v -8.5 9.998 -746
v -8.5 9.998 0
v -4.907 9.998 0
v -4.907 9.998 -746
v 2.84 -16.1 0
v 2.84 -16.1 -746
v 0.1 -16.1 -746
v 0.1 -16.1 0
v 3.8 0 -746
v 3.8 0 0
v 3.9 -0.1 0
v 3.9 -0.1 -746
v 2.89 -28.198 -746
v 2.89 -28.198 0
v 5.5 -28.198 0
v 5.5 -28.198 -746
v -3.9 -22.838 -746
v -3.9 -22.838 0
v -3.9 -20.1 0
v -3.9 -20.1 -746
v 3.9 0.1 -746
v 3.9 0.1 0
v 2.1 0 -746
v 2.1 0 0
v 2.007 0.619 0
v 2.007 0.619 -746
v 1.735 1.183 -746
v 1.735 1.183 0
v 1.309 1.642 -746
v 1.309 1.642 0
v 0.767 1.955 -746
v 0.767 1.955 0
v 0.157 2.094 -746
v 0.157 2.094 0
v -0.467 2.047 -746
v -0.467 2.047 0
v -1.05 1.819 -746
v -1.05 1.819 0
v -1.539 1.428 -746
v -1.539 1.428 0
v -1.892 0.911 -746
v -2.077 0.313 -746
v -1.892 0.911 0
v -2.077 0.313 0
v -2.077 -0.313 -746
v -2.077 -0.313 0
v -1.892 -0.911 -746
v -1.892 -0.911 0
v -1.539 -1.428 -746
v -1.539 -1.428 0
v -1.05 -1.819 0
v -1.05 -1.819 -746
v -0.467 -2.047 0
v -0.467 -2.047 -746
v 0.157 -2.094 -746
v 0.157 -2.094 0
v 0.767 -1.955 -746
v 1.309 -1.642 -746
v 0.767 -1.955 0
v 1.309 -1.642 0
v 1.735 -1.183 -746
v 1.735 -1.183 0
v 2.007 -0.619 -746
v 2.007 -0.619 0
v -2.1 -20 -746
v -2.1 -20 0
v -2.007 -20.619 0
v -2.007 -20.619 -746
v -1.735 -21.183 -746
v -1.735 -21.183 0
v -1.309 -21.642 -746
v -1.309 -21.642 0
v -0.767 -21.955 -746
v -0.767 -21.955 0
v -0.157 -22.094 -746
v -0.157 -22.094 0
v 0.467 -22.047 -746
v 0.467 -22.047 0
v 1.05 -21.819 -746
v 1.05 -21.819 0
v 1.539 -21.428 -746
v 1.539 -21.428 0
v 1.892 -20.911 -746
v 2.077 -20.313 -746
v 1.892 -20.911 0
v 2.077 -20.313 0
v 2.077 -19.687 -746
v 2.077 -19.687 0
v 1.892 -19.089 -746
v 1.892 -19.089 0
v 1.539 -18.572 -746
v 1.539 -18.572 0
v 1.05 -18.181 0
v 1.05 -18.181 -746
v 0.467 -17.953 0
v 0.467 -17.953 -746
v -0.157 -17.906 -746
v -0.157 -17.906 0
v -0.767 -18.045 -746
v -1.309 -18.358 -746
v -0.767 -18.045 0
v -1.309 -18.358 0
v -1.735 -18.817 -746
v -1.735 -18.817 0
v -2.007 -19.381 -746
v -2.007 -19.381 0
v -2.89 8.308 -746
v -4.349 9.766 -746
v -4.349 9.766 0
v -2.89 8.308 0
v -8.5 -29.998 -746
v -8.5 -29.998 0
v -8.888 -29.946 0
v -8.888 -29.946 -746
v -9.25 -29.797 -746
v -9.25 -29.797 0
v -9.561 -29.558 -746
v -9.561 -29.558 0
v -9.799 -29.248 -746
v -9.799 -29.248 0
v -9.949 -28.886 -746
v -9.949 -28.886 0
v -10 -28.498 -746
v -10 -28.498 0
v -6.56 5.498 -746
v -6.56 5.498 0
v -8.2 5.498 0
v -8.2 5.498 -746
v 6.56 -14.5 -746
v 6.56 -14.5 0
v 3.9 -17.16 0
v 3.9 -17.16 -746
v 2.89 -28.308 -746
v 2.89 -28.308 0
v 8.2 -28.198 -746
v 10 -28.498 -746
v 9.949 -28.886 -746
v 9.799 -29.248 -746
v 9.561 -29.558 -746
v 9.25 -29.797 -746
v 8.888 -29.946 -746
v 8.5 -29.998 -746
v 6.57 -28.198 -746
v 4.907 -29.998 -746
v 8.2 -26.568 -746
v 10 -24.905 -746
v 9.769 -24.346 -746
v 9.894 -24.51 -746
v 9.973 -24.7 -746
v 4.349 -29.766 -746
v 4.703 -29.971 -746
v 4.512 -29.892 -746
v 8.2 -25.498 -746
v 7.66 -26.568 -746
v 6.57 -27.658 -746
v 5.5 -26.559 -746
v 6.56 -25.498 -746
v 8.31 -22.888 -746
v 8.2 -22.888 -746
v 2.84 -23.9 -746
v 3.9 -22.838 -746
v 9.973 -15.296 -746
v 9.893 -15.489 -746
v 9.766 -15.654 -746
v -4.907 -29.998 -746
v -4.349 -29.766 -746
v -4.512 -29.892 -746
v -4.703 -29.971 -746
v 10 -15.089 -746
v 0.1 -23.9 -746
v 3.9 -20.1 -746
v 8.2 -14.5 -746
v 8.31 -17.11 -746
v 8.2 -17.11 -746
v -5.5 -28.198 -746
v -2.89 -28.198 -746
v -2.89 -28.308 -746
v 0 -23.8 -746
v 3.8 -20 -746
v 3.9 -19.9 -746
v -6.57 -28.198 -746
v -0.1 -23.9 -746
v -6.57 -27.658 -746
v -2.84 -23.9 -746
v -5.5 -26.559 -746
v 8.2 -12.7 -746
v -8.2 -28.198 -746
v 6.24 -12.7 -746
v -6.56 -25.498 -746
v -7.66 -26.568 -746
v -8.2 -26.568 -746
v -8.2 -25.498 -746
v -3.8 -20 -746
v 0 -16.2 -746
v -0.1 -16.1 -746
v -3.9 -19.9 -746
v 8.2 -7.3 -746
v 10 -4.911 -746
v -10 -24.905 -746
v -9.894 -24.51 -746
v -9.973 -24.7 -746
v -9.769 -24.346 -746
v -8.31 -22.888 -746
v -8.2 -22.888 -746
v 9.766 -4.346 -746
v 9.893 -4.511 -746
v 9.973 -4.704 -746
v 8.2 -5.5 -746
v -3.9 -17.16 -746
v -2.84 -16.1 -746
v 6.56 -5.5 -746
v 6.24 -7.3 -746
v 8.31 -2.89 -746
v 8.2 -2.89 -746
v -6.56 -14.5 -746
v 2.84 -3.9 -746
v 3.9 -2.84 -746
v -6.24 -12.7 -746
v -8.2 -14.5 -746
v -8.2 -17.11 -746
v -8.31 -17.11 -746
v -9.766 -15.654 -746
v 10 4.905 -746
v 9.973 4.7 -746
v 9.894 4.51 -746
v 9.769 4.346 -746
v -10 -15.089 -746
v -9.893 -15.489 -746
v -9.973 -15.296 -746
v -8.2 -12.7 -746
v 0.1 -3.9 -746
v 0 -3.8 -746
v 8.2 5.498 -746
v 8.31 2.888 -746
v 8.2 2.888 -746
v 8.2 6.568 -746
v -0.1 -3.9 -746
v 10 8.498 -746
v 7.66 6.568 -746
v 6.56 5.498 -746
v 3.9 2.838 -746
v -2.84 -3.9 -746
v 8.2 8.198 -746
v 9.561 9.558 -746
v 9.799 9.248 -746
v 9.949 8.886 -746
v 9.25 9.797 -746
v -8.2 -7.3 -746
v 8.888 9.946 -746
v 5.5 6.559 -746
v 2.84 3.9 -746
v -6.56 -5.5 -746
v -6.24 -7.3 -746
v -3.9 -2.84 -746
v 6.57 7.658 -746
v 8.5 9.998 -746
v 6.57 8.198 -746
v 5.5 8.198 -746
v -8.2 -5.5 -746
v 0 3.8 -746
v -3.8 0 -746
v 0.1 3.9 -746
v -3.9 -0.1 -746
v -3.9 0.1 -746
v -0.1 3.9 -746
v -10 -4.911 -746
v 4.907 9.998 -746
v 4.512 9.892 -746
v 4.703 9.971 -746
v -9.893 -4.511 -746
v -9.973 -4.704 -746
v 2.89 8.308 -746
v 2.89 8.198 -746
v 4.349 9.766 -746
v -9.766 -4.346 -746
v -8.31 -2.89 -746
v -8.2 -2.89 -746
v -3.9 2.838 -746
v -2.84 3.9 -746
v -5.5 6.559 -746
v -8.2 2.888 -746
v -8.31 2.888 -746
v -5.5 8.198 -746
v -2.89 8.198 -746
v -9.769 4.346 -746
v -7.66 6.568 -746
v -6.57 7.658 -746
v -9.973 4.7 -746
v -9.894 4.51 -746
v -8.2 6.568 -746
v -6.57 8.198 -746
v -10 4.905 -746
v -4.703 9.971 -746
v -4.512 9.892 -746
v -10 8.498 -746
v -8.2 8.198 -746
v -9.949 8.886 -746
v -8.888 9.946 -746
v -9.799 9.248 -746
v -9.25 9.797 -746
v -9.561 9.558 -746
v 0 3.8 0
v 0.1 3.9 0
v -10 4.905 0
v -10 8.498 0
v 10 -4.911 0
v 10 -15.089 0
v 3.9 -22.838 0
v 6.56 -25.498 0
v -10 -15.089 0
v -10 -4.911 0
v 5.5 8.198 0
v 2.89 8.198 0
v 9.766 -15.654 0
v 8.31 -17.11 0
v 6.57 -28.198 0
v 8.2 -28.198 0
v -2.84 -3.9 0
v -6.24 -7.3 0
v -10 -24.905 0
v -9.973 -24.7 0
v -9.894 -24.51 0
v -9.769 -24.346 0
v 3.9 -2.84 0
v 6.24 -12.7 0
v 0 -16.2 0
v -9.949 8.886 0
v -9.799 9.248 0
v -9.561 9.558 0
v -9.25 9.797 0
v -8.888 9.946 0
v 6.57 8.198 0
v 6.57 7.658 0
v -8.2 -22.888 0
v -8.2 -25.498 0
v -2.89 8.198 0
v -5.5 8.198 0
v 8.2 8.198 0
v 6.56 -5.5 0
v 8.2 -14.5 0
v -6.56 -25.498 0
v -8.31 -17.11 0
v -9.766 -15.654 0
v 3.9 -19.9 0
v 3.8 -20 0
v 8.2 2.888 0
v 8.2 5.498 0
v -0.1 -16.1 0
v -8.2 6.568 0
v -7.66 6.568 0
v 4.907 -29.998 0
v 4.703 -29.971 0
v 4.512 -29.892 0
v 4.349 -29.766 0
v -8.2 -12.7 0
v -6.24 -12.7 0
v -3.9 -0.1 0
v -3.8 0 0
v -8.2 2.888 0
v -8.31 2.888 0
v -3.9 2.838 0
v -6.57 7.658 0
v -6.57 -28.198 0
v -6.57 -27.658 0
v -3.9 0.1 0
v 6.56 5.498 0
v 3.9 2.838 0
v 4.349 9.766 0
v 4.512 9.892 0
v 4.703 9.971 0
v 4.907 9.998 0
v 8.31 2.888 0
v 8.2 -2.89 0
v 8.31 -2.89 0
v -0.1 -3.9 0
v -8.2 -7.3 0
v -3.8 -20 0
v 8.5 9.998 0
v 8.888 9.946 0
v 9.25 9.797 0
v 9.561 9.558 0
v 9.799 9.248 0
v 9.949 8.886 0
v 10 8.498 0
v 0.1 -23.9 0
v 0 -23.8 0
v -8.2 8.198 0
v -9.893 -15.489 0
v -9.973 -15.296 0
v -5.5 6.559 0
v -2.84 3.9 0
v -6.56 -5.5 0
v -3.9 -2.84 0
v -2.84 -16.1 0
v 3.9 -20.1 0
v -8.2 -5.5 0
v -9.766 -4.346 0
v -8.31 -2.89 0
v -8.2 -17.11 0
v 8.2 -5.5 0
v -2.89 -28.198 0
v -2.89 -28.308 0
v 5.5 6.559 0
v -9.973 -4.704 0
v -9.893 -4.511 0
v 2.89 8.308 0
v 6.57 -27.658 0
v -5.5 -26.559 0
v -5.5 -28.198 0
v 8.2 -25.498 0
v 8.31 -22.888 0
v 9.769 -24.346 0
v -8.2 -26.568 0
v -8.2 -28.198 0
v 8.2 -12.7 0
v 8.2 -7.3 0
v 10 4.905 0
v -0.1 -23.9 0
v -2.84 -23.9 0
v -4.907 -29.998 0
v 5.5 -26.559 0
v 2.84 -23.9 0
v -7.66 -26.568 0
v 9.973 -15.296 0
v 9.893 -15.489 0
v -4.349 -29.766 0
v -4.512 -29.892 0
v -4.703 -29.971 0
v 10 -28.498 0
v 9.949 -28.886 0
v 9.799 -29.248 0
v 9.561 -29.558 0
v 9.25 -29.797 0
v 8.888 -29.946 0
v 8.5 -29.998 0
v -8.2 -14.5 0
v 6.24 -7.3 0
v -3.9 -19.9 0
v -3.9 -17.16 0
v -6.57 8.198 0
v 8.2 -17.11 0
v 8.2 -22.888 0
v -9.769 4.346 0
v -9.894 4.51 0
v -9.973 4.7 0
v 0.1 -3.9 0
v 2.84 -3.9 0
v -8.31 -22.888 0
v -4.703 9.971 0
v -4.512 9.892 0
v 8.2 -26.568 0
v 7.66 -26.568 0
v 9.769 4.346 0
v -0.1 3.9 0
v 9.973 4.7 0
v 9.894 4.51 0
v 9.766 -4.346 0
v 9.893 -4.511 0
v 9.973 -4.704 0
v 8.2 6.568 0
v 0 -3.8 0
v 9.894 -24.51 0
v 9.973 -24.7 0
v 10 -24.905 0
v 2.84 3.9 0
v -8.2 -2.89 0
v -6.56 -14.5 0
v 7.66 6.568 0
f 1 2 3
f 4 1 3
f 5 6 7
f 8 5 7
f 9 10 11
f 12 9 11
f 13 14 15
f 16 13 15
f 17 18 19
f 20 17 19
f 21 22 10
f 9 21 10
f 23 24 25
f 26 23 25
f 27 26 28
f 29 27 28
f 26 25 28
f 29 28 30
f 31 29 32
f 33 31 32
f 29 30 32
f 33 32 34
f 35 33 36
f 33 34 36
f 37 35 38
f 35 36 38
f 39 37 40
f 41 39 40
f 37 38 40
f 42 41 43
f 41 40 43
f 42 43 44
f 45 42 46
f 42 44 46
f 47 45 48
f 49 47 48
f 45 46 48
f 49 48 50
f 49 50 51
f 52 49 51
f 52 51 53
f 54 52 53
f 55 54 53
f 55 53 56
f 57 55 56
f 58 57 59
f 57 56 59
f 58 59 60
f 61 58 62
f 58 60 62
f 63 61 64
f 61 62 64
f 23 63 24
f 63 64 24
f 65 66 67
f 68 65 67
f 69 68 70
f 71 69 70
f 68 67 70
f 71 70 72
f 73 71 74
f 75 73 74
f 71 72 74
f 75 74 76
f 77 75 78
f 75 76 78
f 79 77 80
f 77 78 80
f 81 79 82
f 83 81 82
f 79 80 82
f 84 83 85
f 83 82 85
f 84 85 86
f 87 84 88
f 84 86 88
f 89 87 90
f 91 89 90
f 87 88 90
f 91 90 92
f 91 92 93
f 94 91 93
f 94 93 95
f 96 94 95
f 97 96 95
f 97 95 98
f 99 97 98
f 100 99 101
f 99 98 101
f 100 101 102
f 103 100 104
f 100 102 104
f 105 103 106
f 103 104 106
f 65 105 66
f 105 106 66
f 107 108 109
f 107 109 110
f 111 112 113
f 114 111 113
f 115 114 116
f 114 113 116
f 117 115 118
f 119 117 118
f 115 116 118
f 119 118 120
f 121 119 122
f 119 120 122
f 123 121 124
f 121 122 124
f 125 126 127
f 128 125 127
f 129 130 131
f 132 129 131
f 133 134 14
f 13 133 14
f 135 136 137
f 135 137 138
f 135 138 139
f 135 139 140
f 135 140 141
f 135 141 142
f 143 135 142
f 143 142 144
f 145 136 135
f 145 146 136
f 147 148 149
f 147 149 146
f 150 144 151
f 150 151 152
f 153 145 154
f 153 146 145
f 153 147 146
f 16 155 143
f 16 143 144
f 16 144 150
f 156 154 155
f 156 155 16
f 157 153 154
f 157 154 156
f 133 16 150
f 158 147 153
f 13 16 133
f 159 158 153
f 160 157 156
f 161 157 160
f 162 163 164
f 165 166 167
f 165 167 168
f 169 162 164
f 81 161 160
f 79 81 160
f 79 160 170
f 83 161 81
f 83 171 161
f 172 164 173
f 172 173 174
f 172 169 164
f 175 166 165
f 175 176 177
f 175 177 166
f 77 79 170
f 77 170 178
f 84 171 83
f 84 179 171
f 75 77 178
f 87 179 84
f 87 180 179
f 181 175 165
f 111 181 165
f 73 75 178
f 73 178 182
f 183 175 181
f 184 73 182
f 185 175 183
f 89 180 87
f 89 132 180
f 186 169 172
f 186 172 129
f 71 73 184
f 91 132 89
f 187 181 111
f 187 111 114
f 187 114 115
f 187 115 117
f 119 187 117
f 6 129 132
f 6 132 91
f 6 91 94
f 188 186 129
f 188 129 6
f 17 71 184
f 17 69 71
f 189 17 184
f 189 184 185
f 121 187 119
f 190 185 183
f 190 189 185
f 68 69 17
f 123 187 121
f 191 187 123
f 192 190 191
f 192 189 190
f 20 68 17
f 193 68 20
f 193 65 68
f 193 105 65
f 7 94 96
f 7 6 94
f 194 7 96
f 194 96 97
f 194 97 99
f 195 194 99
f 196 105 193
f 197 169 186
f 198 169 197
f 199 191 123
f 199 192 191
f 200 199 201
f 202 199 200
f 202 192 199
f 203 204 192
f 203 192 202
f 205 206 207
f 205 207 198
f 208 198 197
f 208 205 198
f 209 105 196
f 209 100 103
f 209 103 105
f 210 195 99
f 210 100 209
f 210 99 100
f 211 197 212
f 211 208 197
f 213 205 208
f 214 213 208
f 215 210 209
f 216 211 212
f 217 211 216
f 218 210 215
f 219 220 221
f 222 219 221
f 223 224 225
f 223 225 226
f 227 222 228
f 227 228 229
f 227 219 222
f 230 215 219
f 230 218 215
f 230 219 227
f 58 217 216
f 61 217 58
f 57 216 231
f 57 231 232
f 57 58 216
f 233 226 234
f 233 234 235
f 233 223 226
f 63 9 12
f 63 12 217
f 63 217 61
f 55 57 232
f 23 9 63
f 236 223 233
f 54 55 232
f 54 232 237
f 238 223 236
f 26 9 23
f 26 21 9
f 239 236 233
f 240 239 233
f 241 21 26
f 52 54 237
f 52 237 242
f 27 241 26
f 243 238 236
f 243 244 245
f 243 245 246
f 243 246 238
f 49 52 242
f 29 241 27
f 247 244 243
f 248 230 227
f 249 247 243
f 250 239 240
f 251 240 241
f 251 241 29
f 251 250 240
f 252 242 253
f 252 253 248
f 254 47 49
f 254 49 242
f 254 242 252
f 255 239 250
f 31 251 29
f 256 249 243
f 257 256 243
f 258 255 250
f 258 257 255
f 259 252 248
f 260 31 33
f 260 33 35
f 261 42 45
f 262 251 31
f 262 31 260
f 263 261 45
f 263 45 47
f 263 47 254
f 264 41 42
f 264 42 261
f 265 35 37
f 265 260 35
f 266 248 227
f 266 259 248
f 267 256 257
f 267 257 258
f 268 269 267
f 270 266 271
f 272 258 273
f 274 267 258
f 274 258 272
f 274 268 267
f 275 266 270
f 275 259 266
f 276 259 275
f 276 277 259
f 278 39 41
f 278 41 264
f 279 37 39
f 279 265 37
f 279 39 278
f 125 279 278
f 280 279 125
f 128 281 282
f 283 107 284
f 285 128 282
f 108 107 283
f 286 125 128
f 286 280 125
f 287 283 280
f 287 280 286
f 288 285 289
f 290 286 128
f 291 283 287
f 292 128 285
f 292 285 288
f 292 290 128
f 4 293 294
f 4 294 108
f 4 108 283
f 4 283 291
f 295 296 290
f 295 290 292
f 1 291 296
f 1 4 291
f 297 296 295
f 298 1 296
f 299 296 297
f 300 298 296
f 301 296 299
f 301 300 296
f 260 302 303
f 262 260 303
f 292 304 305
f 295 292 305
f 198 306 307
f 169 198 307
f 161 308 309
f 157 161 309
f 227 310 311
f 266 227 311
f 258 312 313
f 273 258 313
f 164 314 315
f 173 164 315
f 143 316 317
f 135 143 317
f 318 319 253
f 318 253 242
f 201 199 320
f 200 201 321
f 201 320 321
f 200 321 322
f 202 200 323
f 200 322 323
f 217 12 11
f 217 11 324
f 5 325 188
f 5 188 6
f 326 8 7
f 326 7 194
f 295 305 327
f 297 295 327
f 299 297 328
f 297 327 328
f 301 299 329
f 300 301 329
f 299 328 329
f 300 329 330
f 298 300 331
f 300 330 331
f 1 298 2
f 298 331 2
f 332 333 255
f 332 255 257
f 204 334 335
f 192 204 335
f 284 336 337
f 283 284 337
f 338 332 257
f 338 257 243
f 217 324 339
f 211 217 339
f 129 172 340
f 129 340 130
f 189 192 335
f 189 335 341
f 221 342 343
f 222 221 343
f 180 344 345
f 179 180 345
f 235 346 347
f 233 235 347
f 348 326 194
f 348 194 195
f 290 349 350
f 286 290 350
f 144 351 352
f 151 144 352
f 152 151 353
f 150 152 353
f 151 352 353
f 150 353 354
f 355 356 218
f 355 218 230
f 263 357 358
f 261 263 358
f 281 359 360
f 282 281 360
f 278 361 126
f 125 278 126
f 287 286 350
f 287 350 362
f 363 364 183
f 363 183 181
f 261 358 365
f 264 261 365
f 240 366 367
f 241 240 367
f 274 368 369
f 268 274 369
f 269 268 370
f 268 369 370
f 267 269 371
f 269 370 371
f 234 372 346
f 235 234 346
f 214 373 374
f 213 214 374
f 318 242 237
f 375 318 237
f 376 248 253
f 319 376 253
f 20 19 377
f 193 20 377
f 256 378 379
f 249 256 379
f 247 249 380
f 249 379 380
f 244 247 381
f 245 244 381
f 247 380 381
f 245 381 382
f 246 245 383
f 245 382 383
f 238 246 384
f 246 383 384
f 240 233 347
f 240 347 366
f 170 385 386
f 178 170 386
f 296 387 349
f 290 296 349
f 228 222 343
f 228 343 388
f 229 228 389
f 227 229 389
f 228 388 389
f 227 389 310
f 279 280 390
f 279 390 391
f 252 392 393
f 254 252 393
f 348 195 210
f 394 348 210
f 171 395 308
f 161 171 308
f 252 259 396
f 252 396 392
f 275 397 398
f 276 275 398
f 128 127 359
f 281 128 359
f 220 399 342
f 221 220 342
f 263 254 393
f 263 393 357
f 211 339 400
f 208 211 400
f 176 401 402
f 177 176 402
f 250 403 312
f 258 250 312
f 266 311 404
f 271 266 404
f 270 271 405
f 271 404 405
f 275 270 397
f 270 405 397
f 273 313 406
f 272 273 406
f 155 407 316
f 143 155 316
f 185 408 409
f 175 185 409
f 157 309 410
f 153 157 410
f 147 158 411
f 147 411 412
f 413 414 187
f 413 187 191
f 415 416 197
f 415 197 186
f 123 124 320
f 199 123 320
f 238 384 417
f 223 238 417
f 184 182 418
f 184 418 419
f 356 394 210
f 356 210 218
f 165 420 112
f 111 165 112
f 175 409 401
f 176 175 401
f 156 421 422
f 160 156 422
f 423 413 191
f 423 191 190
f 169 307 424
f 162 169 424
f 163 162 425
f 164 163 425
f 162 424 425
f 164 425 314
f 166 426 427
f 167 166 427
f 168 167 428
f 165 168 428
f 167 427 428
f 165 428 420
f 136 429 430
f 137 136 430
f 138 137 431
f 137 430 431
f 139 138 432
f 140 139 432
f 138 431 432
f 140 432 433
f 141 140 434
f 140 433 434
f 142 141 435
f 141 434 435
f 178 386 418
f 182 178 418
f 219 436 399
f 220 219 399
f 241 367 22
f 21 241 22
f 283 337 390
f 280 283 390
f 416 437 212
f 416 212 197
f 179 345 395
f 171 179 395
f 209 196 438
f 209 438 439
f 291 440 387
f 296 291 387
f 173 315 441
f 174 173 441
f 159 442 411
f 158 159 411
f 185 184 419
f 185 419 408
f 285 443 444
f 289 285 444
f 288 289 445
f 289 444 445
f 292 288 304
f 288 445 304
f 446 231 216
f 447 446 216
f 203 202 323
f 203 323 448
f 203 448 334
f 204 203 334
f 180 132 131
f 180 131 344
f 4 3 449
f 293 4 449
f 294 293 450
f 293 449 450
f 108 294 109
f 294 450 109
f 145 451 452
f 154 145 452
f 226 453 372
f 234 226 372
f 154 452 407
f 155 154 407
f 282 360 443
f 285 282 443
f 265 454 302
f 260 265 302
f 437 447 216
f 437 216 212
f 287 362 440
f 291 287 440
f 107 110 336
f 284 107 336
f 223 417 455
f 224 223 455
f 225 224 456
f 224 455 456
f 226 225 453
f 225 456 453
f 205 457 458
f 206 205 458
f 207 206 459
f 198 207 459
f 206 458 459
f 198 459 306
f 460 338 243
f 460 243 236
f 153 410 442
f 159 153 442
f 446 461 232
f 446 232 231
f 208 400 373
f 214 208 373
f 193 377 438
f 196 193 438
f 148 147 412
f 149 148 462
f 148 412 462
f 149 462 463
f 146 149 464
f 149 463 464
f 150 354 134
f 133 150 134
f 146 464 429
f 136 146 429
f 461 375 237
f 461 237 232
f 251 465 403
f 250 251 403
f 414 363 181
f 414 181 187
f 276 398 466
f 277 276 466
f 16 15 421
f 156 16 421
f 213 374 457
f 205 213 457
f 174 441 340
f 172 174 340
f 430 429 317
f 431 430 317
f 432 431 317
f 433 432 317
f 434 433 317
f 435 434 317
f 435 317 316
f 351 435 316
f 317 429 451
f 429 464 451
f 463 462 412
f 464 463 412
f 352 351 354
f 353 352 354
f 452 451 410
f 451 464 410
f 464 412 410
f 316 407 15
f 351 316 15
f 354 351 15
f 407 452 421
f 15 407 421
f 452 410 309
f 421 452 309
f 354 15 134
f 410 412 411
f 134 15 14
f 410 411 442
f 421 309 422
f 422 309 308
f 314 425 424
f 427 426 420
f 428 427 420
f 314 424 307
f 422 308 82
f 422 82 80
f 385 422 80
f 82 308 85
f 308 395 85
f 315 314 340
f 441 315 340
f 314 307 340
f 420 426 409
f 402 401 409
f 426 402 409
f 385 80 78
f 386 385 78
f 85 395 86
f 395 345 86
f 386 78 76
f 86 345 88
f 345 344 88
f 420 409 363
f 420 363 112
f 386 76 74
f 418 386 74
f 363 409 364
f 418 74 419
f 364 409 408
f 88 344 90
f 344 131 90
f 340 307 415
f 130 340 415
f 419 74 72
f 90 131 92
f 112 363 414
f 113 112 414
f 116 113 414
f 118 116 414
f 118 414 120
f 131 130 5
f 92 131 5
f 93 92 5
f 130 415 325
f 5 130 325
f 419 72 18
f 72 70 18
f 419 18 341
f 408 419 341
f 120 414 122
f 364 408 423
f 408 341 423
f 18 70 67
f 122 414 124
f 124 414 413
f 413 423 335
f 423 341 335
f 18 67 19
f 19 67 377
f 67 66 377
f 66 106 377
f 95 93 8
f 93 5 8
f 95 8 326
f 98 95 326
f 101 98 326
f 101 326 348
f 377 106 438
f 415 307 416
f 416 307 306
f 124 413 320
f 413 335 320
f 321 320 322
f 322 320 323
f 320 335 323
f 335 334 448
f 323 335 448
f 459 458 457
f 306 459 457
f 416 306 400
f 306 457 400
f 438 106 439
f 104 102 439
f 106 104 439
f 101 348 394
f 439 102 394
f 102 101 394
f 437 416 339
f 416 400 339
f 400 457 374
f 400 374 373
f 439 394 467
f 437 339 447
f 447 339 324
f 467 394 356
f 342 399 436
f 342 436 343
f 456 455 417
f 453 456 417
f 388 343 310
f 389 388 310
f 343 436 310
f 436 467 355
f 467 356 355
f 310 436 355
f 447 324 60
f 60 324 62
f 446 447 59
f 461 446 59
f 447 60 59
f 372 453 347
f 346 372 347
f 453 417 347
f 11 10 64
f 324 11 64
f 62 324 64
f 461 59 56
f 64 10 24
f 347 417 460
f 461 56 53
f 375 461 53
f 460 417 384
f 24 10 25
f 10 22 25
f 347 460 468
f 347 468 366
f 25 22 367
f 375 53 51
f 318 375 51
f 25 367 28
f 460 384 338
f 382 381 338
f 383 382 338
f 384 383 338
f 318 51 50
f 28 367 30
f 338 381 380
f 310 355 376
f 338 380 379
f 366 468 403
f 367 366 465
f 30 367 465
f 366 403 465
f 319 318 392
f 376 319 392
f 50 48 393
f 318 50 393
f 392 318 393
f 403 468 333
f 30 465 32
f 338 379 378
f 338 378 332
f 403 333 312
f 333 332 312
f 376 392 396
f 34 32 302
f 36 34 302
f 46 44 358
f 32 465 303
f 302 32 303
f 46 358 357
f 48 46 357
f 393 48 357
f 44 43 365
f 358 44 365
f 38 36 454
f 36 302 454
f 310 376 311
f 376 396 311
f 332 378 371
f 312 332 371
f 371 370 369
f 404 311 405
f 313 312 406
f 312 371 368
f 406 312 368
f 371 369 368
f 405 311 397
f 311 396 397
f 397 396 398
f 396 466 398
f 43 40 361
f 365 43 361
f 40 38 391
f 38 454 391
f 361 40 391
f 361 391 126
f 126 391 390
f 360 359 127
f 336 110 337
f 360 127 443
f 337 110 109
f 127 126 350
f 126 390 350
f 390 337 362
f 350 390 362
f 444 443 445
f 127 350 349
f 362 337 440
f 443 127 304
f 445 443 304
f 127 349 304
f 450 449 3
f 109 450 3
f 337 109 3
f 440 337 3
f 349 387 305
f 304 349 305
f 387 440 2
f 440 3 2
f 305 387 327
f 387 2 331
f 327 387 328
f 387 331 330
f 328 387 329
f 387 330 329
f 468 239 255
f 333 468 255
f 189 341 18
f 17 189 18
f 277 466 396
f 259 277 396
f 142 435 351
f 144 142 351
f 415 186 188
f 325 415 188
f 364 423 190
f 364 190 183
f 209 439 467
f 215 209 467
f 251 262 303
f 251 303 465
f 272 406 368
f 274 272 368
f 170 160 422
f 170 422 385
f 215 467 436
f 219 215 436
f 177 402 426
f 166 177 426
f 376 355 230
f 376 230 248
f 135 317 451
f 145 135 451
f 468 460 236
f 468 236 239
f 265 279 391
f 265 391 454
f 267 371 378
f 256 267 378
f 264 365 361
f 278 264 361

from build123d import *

# Parameters (mm, degrees)
SKETCH2_R           = 2.1
BOSS_EXTRUDE1_DEPTH = 746


with BuildPart() as part:
    # Sketch2 → Boss-Extrude1 (new body)
    with BuildSketch(Plane.XY):
        with BuildLine():
            Line((-0.1, 3.9), (0, 3.8))
            Line((0, 3.8), (0.1, 3.9))
            Line((0.1, 3.9), (2.840365134, 3.9))
            Line((2.840365134, 3.9), (5.5, 6.558825842))
            Line((5.5, 6.558825842), (5.5, 8.197505675))
            Line((5.5, 8.197505675), (2.89, 8.197505675))
            Line((2.89, 8.197505675), (2.89, 8.307505675))
            Line((2.89, 8.307505675), (4.348614357, 9.766120032))
            ThreePointArc((4.348614357, 9.766120032), (4.604908803, 9.937370505), (4.907228714, 9.997505675))
            Line((4.907228714, 9.997505675), (8.5, 9.997505675))
            ThreePointArc((8.5, 9.997505675), (9.560660172, 9.558165846), (10, 8.497505675))
            Line((10, 8.497505675), (10, 4.904734389))
            ThreePointArc((10, 4.904734389), (9.939864831, 4.602414477), (9.768614357, 4.346120032))
            Line((9.768614357, 4.346120032), (8.31, 2.887505675))
            Line((8.31, 2.887505675), (8.2, 2.887505675))
            Line((8.2, 2.887505675), (8.2, 5.497505675))
            Line((8.2, 5.497505675), (6.56, 5.497505675))
            Line((6.56, 5.497505675), (3.9, 2.83831481))
            Line((3.9, 2.83831481), (3.9, 0.1))
            Line((3.9, 0.1), (3.8, 0))
            Line((3.8, 0), (3.9, -0.1))
            Line((3.9, -0.1), (3.9, -2.84))
            Line((3.9, -2.84), (6.56, -5.5))
            Line((6.56, -5.5), (8.2, -5.5))
            Line((8.2, -5.5), (8.2, -2.89))
            Line((8.2, -2.89), (8.31, -2.89))
            Line((8.31, -2.89), (9.765685425, -4.345685425))
            ThreePointArc((9.765685425, -4.345685425), (9.939103626, -4.605224104), (10, -4.91137085))
            Line((10, -4.91137085), (10, -15.08862915))
            ThreePointArc((10, -15.08862915), (9.939103626, -15.394775896), (9.765685425, -15.654314575))
            Line((9.765685425, -15.654314575), (8.31, -17.11))
            Line((8.31, -17.11), (8.2, -17.11))
            Line((8.2, -17.11), (8.2, -14.5))
            Line((8.2, -14.5), (6.56, -14.5))
            Line((6.56, -14.5), (3.9, -17.16))
            Line((3.9, -17.16), (3.9, -19.9))
            Line((3.9, -19.9), (3.8, -20))
            Line((3.8, -20), (3.9, -20.1))
            Line((3.9, -20.1), (3.9, -22.83831481))
            Line((3.9, -22.83831481), (6.56, -25.497505675))
            Line((6.56, -25.497505675), (8.2, -25.497505675))
            Line((8.2, -25.497505675), (8.2, -22.887505675))
            Line((8.2, -22.887505675), (8.31, -22.887505675))
            Line((8.31, -22.887505675), (9.768614357, -24.346120032))
            ThreePointArc((9.768614357, -24.346120032), (9.939864831, -24.602414477), (10, -24.904734389))
            Line((10, -24.904734389), (10, -28.497505675))
            ThreePointArc((10, -28.497505675), (9.560660172, -29.558165846), (8.5, -29.997505675))
            Line((8.5, -29.997505675), (4.907228714, -29.997505675))
            ThreePointArc((4.907228714, -29.997505675), (4.604908803, -29.937370505), (4.348614357, -29.766120032))
            Line((4.348614357, -29.766120032), (2.89, -28.307505675))
            Line((2.89, -28.307505675), (2.89, -28.197505675))
            Line((2.89, -28.197505675), (5.5, -28.197505675))
            Line((5.5, -28.197505675), (5.5, -26.558825842))
            Line((5.5, -26.558825842), (2.840365134, -23.9))
            Line((2.840365134, -23.9), (0.1, -23.9))
            Line((0.1, -23.9), (0, -23.8))
            Line((0, -23.8), (-0.1, -23.9))
            Line((-0.1, -23.9), (-2.840365134, -23.9))
            Line((-2.840365134, -23.9), (-5.5, -26.558825842))
            Line((-5.5, -26.558825842), (-5.5, -28.197505675))
            Line((-5.5, -28.197505675), (-2.89, -28.197505675))
            Line((-2.89, -28.197505675), (-2.89, -28.307505675))
            Line((-2.89, -28.307505675), (-4.348614357, -29.766120032))
            ThreePointArc((-4.348614357, -29.766120032), (-4.604908803, -29.937370505), (-4.907228714, -29.997505675))
            Line((-4.907228714, -29.997505675), (-8.5, -29.997505675))
            ThreePointArc((-8.5, -29.997505675), (-9.560660172, -29.558165846), (-10, -28.497505675))
            Line((-10, -28.497505675), (-10, -24.904734389))
            ThreePointArc((-10, -24.904734389), (-9.939864831, -24.602414477), (-9.768614357, -24.346120032))
            Line((-9.768614357, -24.346120032), (-8.31, -22.887505675))
            Line((-8.31, -22.887505675), (-8.2, -22.887505675))
            Line((-8.2, -22.887505675), (-8.2, -25.497505675))
            Line((-8.2, -25.497505675), (-6.56, -25.497505675))
            Line((-6.56, -25.497505675), (-3.9, -22.83831481))
            Line((-3.9, -22.83831481), (-3.9, -20.1))
            Line((-3.9, -20.1), (-3.8, -20))
            Line((-3.8, -20), (-3.9, -19.9))
            Line((-3.9, -19.9), (-3.9, -17.16))
            Line((-3.9, -17.16), (-6.56, -14.5))
            Line((-6.56, -14.5), (-8.2, -14.5))
            Line((-8.2, -14.5), (-8.2, -17.11))
            Line((-8.2, -17.11), (-8.31, -17.11))
            Line((-8.31, -17.11), (-9.765685425, -15.654314575))
            ThreePointArc((-9.765685425, -15.654314575), (-9.939103626, -15.394775896), (-10, -15.08862915))
            Line((-10, -15.08862915), (-10, -4.91137085))
            ThreePointArc((-10, -4.91137085), (-9.939103626, -4.605224104), (-9.765685425, -4.345685425))
            Line((-9.765685425, -4.345685425), (-8.31, -2.89))
            Line((-8.31, -2.89), (-8.2, -2.89))
            Line((-8.2, -2.89), (-8.2, -5.5))
            Line((-8.2, -5.5), (-6.56, -5.5))
            Line((-6.56, -5.5), (-3.9, -2.84))
            Line((-3.9, -2.84), (-3.9, -0.1))
            Line((-3.9, -0.1), (-3.8, 0))
            Line((-3.8, 0), (-3.9, 0.1))
            Line((-3.9, 0.1), (-3.9, 2.83831481))
            Line((-3.9, 2.83831481), (-6.56, 5.497505675))
            Line((-6.56, 5.497505675), (-8.2, 5.497505675))
            Line((-8.2, 5.497505675), (-8.2, 2.887505675))
            Line((-8.2, 2.887505675), (-8.31, 2.887505675))
            Line((-8.31, 2.887505675), (-9.768614357, 4.346120032))
            ThreePointArc((-9.768614357, 4.346120032), (-9.939864831, 4.602414477), (-10, 4.904734389))
            Line((-10, 4.904734389), (-10, 8.497505675))
            ThreePointArc((-10, 8.497505675), (-9.560660172, 9.558165846), (-8.5, 9.997505675))
            Line((-8.5, 9.997505675), (-4.907228714, 9.997505675))
            ThreePointArc((-4.907228714, 9.997505675), (-4.604908803, 9.937370505), (-4.348614357, 9.766120032))
            Line((-4.348614357, 9.766120032), (-2.89, 8.307505675))
            Line((-2.89, 8.307505675), (-2.89, 8.197505675))
            Line((-2.89, 8.197505675), (-5.5, 8.197505675))
            Line((-5.5, 8.197505675), (-5.5, 6.558825842))
            Line((-5.5, 6.558825842), (-2.840365134, 3.9))
            Line((-2.840365134, 3.9), (-0.1, 3.9))
        make_face()
        Circle(SKETCH2_R, mode=Mode.SUBTRACT)
        with Locations(Location((0, -20, 0), (0, 0, 180))):
            Circle(SKETCH2_R, mode=Mode.SUBTRACT)
        Polygon((-7.66, 6.567505675), (-6.57, 7.657505675), (-6.57, 8.197505675), (-8.2, 8.197505675), (-8.2, 6.567505675), align=None, mode=Mode.SUBTRACT)
        Polygon((-0.1, -3.9), (0, -3.8), (0.1, -3.9), (2.840365134, -3.9), (6.24, -7.299634866), (8.2, -7.299634866), (8.2, -12.700365134), (6.24, -12.700365134), (2.840365134, -16.1), (0.1, -16.1), (0, -16.2), (-0.1, -16.1), (-2.840365134, -16.1), (-6.24, -12.700365134), (-8.2, -12.700365134), (-8.2, -7.299634866), (-6.24, -7.299634866), (-2.840365134, -3.9), align=None, mode=Mode.SUBTRACT)
        Polygon((8.2, 6.567505675), (7.66, 6.567505675), (6.57, 7.657505675), (6.57, 8.197505675), (8.2, 8.197505675), align=None, mode=Mode.SUBTRACT)
        Polygon((7.66, -26.567505675), (6.57, -27.657505675), (6.57, -28.197505675), (8.2, -28.197505675), (8.2, -26.567505675), align=None, mode=Mode.SUBTRACT)
        Polygon((-8.2, -26.567505675), (-7.66, -26.567505675), (-6.57, -27.657505675), (-6.57, -28.197505675), (-8.2, -28.197505675), align=None, mode=Mode.SUBTRACT)
    extrude(amount=-BOSS_EXTRUDE1_DEPTH)


solid = part.part
